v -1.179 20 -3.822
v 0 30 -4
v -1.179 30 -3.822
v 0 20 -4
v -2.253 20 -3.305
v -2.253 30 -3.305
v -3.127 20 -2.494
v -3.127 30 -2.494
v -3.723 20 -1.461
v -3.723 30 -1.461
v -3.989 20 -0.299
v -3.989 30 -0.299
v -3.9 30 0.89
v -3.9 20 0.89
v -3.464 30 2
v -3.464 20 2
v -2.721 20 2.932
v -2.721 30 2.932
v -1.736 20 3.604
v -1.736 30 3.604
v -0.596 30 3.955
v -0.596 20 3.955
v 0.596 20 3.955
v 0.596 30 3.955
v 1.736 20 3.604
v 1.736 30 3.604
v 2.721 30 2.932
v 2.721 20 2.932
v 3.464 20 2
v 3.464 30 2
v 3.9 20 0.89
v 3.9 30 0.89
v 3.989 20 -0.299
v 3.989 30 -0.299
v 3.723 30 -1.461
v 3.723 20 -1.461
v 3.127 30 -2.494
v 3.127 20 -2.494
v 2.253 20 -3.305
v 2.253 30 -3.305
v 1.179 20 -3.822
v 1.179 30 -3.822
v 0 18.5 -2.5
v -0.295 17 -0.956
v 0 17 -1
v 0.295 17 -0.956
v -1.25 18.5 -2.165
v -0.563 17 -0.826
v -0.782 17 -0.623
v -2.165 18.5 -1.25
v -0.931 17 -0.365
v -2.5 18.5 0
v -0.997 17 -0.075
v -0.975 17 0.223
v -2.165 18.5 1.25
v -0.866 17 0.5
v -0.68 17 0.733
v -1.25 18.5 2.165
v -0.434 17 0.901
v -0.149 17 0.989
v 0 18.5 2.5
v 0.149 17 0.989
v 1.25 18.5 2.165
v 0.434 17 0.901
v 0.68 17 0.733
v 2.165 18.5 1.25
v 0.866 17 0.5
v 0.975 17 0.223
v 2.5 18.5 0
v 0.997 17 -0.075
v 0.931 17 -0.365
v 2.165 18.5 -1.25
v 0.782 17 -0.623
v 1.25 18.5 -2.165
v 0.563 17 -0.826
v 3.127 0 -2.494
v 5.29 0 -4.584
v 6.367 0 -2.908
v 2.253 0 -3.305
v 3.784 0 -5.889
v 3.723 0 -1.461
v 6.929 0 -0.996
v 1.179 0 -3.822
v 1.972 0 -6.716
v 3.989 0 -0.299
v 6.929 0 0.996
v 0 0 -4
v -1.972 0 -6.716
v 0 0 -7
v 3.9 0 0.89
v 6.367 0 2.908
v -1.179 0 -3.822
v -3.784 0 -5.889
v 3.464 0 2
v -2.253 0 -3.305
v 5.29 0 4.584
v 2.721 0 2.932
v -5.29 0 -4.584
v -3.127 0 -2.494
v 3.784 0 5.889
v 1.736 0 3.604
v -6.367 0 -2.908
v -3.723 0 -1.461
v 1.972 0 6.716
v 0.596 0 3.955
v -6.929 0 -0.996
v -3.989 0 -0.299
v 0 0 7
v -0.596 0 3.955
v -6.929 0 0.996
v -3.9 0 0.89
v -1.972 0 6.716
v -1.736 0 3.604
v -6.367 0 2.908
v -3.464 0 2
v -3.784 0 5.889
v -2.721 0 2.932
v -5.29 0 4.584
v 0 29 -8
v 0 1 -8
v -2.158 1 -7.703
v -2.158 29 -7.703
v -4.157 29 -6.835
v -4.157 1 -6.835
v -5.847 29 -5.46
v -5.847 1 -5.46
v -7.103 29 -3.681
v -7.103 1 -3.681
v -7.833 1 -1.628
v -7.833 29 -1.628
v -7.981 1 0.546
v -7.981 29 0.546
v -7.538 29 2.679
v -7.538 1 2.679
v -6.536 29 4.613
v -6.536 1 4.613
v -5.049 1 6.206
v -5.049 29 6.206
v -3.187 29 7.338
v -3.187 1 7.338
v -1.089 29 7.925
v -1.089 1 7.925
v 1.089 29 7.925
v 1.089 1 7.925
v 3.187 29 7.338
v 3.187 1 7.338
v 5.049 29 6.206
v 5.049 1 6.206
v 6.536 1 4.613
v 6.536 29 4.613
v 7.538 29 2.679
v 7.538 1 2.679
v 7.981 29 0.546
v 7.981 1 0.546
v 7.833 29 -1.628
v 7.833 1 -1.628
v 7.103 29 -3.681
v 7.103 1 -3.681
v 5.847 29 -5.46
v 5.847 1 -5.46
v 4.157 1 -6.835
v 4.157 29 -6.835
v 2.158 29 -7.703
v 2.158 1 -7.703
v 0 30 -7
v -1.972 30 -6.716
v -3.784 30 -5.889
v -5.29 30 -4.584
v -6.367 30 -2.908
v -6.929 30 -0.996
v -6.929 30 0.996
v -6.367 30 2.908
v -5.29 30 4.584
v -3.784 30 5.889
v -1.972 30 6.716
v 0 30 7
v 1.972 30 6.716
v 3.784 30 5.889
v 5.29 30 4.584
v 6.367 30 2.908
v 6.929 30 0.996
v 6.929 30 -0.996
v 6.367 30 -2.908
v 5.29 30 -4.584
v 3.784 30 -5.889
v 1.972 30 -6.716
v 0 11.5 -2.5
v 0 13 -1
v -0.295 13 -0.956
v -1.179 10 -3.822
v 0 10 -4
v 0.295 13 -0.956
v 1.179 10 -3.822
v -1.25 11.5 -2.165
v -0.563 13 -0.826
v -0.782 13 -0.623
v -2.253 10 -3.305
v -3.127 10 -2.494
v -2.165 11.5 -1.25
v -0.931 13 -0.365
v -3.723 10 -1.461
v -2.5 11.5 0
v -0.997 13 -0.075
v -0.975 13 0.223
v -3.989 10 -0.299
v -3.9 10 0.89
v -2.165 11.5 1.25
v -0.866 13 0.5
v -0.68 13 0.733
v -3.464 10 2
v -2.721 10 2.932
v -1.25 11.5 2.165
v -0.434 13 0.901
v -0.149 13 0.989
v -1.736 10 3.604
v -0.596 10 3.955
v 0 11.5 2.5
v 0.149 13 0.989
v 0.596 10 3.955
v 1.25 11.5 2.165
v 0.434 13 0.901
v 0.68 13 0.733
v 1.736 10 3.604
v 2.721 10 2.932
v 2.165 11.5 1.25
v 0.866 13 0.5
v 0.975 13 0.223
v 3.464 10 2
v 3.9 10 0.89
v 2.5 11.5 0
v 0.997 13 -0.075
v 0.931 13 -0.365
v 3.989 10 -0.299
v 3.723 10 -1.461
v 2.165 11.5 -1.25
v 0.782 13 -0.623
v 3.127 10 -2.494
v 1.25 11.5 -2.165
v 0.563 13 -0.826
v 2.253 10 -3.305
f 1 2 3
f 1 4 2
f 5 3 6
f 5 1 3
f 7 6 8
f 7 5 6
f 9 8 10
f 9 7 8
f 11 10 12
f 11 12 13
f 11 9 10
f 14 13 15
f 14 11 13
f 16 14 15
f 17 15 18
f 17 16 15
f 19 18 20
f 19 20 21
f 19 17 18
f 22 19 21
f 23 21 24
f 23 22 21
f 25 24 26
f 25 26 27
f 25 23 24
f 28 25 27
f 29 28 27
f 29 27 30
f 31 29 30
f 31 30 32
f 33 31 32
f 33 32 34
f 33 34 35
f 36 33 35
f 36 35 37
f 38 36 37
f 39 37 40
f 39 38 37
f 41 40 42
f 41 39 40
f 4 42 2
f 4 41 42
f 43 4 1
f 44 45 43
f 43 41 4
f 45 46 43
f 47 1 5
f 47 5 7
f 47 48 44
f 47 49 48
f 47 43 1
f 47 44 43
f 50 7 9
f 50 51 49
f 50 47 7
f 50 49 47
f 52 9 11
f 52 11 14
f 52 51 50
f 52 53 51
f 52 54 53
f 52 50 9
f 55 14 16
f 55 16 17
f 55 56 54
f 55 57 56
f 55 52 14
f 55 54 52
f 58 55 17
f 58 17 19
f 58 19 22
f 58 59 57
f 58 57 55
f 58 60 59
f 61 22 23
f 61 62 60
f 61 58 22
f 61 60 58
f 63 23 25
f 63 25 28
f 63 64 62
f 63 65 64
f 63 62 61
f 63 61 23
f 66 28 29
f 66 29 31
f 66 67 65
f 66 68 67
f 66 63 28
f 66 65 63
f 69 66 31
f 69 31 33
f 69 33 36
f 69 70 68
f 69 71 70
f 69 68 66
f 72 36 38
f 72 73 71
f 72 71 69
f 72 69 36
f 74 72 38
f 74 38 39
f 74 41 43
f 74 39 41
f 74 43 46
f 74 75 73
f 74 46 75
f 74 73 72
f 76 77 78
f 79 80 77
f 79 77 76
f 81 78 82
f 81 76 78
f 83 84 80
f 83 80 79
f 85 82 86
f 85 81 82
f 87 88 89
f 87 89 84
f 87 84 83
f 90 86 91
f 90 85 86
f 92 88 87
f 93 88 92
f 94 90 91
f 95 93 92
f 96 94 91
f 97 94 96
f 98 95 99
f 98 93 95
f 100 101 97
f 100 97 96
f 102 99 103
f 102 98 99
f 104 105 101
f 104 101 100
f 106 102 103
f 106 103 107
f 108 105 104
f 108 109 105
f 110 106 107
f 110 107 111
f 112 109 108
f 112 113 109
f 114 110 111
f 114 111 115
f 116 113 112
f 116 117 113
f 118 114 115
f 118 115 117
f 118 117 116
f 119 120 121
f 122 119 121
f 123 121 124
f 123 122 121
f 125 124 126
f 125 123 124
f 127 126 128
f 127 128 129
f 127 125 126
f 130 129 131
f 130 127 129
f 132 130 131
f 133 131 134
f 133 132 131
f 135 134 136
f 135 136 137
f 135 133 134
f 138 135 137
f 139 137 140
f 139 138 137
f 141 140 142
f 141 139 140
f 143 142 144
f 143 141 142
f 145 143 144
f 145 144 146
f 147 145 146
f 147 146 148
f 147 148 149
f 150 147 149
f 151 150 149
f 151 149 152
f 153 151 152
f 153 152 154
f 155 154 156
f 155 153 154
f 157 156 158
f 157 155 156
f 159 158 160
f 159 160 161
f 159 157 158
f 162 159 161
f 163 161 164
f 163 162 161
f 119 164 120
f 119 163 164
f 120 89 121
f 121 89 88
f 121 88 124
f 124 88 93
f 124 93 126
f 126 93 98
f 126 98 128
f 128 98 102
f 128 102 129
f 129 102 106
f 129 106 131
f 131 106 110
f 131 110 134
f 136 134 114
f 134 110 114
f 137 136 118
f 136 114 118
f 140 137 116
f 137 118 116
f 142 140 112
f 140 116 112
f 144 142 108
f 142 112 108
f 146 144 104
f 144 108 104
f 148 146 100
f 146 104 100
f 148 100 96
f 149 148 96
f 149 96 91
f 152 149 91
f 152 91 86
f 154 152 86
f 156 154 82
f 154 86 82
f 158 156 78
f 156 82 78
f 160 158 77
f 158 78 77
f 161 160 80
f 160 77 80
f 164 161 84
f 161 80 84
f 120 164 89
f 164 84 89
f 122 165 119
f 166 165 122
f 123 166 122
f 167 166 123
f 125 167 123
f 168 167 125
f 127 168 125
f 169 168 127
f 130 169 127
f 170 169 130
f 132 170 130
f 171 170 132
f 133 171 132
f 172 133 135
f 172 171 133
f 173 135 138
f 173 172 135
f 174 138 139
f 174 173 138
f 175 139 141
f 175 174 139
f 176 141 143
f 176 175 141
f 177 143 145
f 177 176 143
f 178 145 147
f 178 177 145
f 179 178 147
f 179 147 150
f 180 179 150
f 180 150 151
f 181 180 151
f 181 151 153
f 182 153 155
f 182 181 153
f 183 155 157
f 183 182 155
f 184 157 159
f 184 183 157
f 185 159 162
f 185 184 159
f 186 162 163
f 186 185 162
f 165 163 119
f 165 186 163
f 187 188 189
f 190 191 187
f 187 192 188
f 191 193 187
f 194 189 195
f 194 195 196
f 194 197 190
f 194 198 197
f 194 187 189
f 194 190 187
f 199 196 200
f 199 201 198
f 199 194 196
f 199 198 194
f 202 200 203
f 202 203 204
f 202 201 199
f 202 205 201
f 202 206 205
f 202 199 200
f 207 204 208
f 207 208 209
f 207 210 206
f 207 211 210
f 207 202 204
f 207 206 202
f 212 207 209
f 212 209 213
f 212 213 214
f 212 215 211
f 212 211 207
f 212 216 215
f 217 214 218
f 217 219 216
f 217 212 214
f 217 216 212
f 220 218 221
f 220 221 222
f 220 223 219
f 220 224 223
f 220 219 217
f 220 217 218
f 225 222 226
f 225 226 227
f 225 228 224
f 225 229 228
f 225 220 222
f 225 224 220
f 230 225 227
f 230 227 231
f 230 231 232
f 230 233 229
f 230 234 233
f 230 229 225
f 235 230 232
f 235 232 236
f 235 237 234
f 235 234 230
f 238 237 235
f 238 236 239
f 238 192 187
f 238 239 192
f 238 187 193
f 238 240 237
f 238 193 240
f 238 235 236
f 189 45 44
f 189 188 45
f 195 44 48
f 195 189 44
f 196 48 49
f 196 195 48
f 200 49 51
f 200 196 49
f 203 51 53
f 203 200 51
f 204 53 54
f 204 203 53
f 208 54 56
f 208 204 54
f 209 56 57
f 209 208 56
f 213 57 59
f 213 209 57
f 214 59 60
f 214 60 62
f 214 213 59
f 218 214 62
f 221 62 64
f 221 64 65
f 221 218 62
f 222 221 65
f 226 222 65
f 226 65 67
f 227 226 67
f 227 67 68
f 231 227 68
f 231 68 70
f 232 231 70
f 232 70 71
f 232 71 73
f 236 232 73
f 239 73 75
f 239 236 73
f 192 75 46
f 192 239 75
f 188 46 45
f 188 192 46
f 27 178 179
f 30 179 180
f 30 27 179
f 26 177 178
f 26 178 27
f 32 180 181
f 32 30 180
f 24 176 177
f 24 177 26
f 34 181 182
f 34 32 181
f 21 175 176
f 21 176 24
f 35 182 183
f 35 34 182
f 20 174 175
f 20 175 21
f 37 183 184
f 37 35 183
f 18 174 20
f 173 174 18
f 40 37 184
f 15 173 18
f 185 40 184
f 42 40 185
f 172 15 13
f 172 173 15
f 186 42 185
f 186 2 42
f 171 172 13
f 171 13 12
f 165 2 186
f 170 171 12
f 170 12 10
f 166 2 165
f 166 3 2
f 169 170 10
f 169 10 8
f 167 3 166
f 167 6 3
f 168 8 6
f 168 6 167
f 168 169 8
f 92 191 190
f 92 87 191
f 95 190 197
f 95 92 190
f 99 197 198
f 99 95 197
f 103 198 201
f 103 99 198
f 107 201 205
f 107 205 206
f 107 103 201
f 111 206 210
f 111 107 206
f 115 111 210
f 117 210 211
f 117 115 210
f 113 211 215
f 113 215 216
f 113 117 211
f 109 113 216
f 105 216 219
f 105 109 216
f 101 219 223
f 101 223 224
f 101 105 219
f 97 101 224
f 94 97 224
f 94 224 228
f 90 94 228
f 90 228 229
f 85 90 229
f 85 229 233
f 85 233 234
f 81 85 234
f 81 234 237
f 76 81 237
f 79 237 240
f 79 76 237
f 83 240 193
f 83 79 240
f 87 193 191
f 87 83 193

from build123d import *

# Parameters (mm, degrees)
CHAMFER_1_SIZE = 1


with BuildPart() as part:
    # Эскиз1 → Повернуть1 (revolve)
    with BuildSketch(Plane.XY, mode=Mode.PRIVATE) as revolve_1_sk:
        Polygon((8, 0), (8, 30), (4, 30), (4, 20), (1, 17), (1, 13), (4, 10), (4, 0), align=None)
    revolve(revolve_1_sk.sketch.rotate(Axis((0, 0, 0), (0, 1, 0)), 90), axis=Axis((0, 0, 0), (0, 1, 0)))

    # Фаска1
    chamfer_1_edges = [part.edges().sort_by_distance(p)[0] for p in [
        (0, 0, 8),
        (0, 30, 8),
    ]]
    chamfer(chamfer_1_edges, length=CHAMFER_1_SIZE)


solid = part.part
